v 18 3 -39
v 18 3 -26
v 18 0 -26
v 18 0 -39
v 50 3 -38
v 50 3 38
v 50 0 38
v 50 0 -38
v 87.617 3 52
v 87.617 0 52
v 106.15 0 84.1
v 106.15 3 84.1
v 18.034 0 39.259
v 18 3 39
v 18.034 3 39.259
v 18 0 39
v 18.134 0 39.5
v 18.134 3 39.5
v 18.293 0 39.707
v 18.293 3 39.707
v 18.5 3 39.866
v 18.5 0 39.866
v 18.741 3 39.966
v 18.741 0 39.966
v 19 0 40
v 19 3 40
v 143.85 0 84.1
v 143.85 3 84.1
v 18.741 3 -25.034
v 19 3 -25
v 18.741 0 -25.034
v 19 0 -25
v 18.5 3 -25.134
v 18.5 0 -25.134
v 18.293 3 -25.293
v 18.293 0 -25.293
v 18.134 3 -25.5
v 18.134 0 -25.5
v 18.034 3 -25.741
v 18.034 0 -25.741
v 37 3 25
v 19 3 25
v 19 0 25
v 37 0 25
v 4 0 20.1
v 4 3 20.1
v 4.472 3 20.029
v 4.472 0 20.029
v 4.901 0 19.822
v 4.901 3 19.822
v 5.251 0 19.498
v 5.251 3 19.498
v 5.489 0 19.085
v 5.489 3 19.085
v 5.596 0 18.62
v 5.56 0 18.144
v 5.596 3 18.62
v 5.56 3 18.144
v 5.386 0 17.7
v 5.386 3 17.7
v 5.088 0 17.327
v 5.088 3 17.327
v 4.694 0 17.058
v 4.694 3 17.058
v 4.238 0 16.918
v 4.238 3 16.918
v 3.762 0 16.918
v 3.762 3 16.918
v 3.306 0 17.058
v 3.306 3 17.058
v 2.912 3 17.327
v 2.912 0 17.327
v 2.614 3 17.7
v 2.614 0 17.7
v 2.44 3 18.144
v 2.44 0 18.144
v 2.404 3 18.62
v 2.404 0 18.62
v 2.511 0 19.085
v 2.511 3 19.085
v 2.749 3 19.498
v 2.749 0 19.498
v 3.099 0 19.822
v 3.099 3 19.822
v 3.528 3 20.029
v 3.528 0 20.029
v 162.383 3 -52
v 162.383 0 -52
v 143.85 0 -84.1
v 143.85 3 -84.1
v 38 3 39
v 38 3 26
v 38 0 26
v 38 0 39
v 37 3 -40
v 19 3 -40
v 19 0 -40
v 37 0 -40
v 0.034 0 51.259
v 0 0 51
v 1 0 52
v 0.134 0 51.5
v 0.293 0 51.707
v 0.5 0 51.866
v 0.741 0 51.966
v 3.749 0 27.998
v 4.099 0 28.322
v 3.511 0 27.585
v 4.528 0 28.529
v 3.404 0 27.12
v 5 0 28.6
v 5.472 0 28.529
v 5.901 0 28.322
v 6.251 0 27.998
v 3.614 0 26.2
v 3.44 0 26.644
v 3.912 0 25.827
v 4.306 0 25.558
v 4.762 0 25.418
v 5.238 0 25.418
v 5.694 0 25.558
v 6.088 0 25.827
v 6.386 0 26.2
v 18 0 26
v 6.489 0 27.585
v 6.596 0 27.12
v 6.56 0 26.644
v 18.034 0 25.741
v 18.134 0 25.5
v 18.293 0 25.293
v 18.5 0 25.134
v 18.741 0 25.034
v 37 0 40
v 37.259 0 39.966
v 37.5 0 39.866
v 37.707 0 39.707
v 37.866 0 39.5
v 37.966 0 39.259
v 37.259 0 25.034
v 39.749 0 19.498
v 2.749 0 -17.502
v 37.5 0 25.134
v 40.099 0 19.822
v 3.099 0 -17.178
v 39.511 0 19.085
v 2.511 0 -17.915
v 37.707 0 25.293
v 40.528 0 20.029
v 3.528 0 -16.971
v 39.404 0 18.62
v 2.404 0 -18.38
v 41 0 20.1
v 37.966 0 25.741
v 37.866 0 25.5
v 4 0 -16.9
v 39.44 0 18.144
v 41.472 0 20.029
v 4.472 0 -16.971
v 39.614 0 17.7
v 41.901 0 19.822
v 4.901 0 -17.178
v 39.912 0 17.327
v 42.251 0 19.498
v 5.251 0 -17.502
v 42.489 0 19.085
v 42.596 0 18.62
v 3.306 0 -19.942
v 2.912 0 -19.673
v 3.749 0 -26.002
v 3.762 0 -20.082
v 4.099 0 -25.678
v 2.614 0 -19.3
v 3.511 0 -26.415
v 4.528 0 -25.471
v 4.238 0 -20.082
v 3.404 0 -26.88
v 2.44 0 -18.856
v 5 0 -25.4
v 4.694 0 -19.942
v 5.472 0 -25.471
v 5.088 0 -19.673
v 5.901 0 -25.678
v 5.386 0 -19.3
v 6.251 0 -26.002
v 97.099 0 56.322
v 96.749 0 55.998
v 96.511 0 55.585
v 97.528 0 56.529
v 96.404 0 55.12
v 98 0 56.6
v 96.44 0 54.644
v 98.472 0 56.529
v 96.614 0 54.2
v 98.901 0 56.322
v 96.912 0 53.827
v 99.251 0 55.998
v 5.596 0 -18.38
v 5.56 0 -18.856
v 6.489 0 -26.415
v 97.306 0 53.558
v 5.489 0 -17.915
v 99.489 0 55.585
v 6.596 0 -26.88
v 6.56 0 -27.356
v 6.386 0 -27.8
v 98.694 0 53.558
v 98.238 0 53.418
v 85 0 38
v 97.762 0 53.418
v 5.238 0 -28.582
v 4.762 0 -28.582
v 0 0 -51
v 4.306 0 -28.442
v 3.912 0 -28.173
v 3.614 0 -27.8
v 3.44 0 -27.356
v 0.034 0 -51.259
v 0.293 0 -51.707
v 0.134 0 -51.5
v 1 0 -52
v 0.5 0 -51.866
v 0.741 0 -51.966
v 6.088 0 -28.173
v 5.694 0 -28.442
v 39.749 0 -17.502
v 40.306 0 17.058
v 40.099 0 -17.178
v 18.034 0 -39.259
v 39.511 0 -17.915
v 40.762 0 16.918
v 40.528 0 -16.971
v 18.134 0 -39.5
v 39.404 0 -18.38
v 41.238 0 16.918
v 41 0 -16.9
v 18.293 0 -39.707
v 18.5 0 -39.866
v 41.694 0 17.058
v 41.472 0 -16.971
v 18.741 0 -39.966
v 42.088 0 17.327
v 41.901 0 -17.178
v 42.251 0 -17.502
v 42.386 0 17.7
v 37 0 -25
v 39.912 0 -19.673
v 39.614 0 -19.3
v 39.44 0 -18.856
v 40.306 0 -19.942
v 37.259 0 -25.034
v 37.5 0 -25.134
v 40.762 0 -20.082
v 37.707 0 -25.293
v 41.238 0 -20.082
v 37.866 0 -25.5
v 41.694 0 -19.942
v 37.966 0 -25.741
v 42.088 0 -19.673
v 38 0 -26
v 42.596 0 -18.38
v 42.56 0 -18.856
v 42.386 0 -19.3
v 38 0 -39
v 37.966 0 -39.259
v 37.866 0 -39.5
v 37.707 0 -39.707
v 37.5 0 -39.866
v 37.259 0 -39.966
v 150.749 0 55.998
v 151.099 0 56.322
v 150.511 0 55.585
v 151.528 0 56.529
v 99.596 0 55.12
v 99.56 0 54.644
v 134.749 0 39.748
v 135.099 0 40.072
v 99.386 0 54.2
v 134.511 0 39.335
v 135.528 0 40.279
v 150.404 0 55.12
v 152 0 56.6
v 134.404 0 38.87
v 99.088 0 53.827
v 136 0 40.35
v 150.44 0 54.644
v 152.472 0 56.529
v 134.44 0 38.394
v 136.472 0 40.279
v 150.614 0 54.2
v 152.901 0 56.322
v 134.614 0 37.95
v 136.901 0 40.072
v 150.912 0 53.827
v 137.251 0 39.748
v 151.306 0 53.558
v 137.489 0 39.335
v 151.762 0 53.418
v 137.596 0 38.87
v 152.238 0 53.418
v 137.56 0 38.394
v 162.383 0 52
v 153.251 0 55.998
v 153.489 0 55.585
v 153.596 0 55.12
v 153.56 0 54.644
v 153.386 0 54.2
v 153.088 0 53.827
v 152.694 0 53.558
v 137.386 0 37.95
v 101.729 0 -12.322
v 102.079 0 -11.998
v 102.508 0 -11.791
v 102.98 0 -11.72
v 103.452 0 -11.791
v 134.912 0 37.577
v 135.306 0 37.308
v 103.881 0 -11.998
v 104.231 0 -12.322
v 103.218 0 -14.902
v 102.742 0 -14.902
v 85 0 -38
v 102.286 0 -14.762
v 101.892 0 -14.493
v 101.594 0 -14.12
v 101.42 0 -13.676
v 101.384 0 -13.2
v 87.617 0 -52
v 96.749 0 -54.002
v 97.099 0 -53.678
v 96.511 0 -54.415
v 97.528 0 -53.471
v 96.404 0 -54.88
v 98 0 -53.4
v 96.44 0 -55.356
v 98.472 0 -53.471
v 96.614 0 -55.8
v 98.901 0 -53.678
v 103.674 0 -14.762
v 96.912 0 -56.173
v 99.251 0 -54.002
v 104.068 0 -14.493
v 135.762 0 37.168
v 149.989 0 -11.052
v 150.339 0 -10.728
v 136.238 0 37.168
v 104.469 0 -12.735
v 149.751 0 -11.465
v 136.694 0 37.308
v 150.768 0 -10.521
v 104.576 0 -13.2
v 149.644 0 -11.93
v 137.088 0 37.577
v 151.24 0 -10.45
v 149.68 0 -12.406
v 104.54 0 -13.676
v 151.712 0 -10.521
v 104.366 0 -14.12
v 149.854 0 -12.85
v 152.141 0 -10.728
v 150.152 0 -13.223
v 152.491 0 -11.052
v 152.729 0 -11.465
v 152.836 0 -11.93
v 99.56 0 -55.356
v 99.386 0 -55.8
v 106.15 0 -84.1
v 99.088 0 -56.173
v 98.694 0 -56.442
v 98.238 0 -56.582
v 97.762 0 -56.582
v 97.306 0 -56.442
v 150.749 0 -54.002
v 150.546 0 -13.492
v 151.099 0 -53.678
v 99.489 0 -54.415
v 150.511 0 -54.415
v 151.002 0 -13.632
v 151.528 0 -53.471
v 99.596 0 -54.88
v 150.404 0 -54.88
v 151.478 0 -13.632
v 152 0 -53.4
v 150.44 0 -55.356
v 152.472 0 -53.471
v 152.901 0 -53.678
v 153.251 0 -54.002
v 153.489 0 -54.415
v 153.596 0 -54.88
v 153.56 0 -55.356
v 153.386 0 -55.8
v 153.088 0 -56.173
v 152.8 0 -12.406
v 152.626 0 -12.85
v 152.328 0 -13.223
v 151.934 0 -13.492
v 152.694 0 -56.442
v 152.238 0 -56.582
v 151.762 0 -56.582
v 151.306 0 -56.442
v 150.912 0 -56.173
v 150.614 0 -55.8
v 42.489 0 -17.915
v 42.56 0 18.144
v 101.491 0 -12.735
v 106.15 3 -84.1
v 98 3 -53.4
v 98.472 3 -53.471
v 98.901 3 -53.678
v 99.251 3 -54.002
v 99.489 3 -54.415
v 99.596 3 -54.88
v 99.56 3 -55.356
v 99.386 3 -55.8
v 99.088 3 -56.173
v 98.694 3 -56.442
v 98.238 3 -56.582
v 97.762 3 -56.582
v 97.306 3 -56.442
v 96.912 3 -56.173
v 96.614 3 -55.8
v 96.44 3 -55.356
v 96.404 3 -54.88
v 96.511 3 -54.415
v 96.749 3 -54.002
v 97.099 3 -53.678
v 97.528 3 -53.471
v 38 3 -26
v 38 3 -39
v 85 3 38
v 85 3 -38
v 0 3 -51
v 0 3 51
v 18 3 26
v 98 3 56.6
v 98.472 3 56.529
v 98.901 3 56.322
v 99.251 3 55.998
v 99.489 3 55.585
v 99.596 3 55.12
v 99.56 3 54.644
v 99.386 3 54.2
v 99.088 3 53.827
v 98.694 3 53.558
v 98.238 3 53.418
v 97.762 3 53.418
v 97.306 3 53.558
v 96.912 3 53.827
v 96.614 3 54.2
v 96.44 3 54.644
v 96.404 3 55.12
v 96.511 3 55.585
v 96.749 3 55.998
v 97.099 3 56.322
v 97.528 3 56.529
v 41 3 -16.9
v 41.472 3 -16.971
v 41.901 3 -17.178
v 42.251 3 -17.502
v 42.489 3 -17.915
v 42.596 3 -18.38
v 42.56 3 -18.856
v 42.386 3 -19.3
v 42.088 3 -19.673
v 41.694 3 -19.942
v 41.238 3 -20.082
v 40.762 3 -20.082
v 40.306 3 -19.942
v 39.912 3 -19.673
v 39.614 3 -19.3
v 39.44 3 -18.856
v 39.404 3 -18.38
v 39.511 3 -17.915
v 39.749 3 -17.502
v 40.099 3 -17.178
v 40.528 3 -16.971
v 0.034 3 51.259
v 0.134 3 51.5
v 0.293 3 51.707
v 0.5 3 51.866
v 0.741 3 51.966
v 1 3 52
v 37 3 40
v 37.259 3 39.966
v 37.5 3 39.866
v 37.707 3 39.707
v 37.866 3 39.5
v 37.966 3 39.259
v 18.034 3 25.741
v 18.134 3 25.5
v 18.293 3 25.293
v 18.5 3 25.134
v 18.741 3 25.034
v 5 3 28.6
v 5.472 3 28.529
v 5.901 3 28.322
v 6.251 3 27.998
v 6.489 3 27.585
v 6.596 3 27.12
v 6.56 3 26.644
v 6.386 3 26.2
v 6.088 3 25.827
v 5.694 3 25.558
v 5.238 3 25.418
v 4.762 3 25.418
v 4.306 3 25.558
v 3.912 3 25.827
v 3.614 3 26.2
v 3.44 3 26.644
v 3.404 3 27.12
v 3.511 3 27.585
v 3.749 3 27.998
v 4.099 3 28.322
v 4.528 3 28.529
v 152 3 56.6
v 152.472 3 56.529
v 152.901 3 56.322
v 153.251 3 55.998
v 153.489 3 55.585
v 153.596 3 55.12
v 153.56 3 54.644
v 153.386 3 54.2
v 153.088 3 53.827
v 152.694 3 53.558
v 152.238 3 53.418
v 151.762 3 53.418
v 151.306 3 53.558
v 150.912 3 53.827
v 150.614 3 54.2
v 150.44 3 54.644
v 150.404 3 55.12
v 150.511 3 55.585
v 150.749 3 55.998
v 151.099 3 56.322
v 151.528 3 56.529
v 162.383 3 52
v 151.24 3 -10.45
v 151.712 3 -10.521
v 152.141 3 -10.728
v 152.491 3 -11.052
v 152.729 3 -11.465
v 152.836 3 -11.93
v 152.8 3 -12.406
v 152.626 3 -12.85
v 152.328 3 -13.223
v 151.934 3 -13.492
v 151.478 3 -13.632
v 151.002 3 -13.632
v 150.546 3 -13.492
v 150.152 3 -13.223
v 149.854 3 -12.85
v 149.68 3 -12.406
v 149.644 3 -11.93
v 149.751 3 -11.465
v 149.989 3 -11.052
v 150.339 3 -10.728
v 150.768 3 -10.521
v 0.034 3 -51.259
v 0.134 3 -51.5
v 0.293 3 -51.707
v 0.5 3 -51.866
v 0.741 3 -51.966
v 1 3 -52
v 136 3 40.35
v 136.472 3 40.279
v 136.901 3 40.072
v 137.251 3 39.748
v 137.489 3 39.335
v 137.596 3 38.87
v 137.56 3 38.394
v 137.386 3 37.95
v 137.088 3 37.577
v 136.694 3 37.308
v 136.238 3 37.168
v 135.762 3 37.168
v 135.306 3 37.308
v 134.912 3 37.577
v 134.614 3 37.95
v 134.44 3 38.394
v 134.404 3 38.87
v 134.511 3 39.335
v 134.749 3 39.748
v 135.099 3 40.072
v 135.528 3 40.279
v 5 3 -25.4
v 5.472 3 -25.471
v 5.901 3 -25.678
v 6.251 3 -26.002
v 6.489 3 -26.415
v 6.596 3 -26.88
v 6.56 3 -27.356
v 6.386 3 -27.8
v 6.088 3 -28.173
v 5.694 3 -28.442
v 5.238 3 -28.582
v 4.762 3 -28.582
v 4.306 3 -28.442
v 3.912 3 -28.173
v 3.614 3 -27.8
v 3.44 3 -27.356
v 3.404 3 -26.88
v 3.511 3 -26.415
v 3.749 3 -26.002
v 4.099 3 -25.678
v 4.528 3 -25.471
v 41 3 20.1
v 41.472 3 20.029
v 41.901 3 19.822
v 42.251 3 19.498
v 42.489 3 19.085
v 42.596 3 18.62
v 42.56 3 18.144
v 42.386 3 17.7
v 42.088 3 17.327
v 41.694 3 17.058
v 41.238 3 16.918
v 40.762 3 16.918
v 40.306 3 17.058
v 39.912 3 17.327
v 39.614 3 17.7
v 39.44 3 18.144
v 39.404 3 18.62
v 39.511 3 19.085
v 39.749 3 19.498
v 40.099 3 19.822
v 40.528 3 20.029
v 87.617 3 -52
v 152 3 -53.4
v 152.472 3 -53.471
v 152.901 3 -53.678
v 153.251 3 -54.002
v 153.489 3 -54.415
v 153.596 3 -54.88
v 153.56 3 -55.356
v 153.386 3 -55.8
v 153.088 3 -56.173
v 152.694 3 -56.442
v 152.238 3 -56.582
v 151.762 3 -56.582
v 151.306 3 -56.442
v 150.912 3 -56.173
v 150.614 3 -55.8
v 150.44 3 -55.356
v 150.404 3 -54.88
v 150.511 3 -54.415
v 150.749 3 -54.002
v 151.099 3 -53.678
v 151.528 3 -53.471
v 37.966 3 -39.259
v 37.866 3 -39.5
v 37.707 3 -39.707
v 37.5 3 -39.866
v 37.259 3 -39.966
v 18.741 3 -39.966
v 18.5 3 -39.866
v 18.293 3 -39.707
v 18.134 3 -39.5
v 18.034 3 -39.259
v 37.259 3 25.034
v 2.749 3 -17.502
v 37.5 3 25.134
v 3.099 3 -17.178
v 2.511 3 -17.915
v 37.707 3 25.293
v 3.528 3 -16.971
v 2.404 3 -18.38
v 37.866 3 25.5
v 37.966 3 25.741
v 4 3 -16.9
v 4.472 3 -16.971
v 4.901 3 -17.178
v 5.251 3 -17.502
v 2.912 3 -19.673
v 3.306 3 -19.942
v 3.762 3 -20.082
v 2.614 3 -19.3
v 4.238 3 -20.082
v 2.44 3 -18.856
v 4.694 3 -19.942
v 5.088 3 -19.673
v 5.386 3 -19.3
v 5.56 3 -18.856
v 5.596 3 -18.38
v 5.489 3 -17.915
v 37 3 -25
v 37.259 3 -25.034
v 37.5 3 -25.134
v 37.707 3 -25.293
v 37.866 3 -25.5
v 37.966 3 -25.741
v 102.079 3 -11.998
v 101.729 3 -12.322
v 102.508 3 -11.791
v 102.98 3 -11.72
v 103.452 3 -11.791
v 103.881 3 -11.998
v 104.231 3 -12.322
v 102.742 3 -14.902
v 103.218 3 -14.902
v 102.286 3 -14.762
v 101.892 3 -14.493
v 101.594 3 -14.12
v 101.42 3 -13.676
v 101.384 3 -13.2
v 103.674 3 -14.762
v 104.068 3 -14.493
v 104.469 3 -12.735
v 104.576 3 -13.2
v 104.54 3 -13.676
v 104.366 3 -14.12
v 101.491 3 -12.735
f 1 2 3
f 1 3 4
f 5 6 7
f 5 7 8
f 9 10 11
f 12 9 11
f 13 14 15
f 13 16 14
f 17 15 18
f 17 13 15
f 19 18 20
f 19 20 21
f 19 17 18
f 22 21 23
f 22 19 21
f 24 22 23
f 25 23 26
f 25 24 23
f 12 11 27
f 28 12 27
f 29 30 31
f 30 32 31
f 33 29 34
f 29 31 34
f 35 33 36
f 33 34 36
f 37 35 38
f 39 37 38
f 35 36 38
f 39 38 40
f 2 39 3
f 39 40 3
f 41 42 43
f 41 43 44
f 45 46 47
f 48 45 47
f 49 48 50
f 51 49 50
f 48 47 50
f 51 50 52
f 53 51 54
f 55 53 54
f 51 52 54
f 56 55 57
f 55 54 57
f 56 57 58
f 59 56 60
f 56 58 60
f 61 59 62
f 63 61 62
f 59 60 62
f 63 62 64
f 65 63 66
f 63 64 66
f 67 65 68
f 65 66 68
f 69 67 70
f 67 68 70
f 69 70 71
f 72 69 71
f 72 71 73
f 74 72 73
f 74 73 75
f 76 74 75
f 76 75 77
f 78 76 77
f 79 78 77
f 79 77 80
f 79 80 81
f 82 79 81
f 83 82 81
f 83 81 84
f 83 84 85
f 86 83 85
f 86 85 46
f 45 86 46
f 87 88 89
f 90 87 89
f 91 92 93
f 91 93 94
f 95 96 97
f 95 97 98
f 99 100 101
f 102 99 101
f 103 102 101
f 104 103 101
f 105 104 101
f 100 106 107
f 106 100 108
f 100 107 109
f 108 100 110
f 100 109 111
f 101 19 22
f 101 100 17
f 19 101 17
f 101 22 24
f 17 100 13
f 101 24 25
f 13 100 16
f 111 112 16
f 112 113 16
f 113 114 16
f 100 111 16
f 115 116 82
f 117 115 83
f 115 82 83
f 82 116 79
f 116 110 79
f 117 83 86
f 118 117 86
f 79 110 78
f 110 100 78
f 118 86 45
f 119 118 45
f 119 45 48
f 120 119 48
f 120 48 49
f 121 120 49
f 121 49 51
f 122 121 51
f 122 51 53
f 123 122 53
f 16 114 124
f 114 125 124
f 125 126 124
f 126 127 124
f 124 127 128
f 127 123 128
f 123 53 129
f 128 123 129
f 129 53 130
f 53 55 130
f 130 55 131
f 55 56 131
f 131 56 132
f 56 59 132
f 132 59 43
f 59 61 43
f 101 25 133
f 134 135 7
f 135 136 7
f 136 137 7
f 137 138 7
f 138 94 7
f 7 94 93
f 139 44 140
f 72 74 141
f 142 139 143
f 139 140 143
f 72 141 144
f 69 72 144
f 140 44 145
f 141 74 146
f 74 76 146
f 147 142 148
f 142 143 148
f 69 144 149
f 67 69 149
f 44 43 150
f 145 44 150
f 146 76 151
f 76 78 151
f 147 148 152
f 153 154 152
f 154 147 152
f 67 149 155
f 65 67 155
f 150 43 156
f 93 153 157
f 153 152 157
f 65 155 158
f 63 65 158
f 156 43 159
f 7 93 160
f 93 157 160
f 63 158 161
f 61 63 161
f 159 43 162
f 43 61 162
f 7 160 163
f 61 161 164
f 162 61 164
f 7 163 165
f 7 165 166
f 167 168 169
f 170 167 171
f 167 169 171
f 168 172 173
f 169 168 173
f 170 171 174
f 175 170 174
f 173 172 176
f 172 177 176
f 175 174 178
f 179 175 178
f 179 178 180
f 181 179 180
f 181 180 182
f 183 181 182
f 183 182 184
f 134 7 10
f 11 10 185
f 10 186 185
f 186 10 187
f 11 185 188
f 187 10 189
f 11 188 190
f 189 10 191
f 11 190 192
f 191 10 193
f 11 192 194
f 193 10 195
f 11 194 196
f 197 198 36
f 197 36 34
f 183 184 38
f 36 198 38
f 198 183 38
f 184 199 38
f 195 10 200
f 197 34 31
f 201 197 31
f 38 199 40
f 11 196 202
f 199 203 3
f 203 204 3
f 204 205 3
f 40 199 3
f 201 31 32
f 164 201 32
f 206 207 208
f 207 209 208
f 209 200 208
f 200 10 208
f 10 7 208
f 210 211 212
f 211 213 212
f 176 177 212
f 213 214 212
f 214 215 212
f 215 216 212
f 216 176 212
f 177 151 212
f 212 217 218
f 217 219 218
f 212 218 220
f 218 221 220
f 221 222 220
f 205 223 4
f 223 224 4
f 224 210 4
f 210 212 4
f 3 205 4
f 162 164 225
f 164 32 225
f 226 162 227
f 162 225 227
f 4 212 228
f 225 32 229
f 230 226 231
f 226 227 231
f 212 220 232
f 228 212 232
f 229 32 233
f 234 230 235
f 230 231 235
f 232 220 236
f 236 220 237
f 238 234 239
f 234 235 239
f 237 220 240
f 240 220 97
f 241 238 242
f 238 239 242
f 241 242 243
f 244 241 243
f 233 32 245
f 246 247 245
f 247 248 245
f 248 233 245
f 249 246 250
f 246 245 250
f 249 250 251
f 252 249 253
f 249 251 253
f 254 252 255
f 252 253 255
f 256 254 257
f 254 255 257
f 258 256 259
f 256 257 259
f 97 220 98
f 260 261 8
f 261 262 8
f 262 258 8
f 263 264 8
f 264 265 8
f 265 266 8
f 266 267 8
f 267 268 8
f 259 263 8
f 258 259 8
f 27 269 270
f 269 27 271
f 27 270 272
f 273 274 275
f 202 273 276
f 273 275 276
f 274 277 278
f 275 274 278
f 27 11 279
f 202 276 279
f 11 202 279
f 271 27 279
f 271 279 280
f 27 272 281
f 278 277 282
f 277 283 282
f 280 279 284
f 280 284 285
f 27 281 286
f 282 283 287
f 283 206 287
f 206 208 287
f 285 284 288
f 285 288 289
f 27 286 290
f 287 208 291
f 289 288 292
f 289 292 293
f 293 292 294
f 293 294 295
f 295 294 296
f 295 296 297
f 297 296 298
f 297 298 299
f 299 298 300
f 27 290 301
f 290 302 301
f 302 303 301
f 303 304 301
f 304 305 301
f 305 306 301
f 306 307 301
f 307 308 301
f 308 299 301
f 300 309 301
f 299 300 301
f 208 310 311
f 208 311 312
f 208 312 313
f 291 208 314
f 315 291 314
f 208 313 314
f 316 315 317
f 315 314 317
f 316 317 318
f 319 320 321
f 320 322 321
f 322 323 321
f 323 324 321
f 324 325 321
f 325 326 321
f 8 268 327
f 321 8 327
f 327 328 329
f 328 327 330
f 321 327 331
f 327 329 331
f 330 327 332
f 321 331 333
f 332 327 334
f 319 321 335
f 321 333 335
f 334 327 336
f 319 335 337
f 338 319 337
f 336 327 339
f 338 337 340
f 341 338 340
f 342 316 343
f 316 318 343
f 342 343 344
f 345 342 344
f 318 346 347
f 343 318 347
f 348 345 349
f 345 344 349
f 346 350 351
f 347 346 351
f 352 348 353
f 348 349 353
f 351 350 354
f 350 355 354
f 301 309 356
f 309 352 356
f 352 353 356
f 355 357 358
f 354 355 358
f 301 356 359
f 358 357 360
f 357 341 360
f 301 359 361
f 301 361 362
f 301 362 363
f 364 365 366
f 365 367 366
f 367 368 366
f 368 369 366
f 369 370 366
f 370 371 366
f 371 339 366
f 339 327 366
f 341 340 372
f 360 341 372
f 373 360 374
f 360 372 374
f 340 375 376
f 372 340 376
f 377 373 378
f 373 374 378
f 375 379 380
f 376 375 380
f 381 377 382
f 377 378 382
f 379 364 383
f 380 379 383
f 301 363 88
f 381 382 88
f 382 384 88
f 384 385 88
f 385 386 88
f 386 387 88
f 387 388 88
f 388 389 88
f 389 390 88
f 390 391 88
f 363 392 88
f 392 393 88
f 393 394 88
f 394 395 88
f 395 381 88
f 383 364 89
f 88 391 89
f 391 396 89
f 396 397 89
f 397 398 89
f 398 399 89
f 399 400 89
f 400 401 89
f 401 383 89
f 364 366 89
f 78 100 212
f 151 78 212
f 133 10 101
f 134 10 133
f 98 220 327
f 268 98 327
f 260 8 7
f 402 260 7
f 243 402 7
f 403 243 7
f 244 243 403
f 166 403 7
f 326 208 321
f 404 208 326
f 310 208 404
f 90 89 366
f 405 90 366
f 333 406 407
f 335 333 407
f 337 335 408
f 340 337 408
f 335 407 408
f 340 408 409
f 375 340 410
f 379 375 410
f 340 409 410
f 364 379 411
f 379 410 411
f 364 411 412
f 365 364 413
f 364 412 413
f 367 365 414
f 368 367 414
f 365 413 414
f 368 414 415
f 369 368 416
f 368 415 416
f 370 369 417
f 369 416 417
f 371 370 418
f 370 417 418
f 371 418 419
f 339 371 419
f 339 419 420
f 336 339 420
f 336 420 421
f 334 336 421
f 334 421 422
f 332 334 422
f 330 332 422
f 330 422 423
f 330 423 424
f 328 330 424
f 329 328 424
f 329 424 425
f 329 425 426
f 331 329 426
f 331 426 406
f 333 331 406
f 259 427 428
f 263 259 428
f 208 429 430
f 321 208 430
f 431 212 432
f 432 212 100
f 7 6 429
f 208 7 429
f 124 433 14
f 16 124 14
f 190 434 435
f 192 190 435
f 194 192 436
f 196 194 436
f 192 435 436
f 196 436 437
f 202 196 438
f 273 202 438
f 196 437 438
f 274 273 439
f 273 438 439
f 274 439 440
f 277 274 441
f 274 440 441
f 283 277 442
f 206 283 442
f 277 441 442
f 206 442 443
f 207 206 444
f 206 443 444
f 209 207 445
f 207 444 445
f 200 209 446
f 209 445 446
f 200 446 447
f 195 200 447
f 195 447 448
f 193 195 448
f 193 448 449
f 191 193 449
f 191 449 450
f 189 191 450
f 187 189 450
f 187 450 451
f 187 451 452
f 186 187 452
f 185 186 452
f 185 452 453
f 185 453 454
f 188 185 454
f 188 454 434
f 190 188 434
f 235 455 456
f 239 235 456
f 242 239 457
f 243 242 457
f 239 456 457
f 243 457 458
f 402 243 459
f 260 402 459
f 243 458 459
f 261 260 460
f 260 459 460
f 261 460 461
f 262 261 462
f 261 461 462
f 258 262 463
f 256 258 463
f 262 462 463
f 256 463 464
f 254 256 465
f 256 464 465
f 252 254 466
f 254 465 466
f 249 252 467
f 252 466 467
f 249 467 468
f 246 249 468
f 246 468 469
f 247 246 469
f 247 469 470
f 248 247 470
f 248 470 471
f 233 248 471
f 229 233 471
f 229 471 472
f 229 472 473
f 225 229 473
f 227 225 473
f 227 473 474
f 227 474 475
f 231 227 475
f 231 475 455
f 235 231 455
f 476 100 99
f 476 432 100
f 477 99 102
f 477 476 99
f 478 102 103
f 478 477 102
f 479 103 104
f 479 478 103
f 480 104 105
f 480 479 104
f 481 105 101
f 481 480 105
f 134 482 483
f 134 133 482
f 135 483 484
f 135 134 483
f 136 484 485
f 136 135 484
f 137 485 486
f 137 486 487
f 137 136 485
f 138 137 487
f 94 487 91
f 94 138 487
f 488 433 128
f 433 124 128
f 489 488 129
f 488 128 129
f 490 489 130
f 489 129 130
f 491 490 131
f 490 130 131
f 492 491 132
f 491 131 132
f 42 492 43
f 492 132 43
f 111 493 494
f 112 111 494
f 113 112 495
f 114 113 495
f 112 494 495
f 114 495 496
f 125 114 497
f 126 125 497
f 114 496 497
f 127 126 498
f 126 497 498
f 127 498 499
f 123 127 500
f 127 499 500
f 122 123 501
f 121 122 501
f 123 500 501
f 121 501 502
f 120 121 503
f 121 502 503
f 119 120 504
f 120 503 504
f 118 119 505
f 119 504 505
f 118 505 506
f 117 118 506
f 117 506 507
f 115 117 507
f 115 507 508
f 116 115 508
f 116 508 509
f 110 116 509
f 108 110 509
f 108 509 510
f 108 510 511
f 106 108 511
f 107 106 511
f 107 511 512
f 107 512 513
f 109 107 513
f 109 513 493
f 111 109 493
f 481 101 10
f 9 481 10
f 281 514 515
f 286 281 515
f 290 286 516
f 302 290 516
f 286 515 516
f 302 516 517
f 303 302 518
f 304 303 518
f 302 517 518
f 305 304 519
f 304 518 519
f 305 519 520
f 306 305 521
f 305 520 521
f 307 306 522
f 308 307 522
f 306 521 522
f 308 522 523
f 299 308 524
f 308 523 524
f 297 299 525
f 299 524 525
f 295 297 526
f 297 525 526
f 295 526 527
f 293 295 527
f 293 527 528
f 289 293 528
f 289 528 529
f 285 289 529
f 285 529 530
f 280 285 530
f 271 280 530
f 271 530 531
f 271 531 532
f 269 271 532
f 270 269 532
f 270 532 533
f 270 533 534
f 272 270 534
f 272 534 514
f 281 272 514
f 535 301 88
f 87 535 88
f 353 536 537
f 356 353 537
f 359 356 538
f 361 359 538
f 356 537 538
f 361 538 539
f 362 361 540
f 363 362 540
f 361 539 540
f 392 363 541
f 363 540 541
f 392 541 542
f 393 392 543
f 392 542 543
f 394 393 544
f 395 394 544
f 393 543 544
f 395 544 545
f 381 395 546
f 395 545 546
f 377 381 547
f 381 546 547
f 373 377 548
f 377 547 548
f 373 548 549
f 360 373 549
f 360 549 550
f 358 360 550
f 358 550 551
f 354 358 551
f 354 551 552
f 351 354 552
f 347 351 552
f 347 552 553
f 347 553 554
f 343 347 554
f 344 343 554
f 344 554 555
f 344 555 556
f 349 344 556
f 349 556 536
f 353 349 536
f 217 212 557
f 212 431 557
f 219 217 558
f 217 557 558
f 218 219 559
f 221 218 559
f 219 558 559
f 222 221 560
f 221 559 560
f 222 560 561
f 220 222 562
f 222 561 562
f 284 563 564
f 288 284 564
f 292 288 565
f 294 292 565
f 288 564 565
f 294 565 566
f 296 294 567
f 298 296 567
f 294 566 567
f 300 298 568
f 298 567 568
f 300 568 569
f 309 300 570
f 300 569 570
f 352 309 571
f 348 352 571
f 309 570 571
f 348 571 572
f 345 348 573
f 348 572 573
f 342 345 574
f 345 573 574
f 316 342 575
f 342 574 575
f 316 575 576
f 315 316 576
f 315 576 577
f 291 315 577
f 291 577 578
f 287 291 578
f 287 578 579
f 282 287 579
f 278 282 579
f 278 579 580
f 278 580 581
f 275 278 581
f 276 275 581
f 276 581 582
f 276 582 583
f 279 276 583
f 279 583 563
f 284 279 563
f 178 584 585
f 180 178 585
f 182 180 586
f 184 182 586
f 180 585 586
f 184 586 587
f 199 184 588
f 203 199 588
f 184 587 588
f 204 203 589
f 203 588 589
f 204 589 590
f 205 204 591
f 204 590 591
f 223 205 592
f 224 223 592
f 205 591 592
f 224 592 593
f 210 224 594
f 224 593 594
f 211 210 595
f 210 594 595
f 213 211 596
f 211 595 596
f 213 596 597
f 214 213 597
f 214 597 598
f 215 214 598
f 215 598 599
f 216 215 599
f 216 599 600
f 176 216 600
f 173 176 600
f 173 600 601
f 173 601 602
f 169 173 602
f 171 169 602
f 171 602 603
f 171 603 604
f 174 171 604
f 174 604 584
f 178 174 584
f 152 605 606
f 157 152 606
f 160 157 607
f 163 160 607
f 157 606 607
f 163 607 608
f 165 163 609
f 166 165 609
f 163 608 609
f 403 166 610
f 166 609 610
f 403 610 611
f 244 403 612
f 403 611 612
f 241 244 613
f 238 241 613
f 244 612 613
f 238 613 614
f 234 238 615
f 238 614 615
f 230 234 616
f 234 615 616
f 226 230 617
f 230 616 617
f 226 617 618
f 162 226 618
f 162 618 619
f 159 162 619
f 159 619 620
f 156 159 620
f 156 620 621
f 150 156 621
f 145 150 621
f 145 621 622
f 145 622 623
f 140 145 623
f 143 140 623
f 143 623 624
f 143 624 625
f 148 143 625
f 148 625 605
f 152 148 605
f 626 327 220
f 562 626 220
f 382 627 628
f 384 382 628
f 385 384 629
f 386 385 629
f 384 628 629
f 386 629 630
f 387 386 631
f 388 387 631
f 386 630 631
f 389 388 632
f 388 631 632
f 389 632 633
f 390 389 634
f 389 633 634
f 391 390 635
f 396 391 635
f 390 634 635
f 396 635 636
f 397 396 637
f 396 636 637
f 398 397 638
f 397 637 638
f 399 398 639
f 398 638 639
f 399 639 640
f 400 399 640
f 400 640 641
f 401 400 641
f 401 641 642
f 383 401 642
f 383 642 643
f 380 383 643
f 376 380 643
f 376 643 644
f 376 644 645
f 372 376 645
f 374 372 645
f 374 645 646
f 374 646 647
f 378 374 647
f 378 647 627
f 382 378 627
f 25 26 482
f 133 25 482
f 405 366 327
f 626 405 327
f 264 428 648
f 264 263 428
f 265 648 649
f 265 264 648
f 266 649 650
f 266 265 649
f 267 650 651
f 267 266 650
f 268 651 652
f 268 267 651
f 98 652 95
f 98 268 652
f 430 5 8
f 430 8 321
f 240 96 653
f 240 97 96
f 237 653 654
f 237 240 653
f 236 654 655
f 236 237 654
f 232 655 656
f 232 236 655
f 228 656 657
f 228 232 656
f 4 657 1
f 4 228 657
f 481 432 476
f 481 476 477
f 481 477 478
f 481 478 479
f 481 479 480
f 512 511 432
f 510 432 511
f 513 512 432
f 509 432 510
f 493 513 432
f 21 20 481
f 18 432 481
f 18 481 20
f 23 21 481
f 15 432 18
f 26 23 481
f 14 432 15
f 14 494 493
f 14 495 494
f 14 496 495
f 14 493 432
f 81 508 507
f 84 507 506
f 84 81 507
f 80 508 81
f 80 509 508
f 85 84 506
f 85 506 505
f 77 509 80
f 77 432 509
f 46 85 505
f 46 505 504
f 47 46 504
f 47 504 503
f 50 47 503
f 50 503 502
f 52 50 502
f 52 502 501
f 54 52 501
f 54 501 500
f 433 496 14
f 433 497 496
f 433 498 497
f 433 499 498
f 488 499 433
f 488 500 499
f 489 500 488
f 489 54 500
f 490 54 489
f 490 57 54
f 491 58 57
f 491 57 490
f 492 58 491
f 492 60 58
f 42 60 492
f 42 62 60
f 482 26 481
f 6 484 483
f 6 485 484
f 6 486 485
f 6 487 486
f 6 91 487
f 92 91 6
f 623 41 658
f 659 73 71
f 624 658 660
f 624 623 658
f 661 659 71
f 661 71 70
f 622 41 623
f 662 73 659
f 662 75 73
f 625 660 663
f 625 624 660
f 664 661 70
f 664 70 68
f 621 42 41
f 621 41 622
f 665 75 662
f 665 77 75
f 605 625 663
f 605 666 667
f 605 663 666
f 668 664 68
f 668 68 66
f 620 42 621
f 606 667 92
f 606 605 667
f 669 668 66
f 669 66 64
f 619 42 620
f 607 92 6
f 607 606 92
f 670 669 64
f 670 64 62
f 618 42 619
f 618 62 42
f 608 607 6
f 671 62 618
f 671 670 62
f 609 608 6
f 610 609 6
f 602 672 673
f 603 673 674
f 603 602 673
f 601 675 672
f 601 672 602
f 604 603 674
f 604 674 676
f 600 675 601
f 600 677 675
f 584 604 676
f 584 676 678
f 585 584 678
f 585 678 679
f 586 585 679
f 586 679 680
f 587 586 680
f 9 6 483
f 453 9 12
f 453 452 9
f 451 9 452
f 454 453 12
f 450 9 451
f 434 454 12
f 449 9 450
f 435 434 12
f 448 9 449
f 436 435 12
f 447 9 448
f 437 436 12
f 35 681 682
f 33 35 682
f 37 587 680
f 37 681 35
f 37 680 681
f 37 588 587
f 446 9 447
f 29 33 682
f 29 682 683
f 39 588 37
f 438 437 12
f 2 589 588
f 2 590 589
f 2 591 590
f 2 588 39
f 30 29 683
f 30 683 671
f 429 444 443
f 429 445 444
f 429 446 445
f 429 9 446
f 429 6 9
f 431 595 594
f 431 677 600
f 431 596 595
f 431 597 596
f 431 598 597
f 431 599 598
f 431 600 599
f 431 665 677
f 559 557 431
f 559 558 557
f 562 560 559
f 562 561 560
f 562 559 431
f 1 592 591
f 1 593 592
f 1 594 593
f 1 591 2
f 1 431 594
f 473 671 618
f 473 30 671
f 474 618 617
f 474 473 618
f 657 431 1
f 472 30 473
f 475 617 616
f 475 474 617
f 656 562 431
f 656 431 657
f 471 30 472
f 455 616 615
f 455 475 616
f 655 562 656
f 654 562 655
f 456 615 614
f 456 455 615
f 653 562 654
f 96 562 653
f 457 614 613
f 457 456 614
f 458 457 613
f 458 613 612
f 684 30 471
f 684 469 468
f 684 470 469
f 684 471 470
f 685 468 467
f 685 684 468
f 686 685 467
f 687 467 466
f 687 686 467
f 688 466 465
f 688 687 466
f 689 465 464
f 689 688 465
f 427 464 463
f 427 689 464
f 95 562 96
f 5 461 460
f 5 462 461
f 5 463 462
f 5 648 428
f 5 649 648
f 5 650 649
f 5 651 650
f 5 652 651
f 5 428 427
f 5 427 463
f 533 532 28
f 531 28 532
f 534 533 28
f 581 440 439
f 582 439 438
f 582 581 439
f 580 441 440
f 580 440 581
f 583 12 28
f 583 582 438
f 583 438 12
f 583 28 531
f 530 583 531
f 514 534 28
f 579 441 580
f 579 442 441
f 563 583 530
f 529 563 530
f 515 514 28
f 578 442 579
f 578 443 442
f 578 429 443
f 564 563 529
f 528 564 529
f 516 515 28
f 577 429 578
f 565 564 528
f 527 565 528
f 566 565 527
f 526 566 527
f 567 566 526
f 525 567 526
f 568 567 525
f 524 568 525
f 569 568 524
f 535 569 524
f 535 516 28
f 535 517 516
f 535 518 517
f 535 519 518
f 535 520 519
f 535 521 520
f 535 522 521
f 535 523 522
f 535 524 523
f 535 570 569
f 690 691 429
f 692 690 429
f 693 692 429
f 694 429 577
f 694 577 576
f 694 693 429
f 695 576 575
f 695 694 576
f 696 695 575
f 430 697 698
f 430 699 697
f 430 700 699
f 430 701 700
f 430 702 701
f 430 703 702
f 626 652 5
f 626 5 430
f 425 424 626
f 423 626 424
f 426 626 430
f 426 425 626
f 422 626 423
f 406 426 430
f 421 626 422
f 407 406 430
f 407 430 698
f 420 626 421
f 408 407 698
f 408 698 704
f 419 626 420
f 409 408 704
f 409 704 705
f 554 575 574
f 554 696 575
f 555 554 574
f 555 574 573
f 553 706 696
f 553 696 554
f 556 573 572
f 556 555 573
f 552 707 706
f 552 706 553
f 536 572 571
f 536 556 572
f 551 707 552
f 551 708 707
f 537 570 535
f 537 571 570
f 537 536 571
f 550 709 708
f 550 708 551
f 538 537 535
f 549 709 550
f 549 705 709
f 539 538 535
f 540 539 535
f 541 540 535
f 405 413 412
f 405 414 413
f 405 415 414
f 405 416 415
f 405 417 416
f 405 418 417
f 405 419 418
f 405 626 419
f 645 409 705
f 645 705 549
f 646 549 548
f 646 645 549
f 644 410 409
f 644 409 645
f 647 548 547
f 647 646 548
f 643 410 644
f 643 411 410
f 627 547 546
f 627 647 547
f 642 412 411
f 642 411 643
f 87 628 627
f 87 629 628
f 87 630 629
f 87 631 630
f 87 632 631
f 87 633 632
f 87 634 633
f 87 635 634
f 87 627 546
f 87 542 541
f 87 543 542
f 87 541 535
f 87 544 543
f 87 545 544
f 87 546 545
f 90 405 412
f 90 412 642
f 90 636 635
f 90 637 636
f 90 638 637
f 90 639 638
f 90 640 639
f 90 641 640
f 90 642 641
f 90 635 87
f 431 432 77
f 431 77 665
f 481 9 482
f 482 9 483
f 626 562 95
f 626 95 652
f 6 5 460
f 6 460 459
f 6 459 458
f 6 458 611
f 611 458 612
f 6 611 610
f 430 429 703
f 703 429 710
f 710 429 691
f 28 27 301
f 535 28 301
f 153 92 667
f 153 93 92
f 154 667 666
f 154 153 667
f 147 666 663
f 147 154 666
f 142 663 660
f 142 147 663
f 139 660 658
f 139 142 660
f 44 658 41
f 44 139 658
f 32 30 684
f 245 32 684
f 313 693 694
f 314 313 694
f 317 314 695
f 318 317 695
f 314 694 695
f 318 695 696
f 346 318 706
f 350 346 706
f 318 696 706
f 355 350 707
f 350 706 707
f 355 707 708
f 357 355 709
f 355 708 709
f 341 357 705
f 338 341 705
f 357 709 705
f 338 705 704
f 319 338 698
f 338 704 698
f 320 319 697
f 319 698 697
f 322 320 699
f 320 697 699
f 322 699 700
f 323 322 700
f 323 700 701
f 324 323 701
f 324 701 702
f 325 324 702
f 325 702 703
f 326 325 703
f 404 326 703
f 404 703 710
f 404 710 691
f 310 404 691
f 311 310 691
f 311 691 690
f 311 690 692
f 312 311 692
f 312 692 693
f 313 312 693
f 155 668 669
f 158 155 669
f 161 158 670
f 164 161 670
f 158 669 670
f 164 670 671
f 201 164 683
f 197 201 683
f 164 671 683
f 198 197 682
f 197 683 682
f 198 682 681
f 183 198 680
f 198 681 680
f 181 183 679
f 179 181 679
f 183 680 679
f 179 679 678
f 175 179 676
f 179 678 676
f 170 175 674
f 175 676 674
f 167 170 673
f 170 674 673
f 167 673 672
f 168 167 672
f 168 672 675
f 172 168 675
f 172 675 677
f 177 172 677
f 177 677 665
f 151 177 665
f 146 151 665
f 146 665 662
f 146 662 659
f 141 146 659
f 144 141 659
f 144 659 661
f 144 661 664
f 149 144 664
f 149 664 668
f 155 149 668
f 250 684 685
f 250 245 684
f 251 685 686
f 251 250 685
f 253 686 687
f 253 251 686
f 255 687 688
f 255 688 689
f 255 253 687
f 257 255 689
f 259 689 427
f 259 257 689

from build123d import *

# Parameters (mm, degrees)
BOSS_EXTRUDE1_DEPTH                        = 3
FILLET1_R                                  = 1
SKETCH2_R                                  = 1.6
MOTOR_DRIVER_HOLES_DEPTH                   = 183.893494651
SKETCH3_W                                  = 20
SKETCH3_H                                  = 15
MOTOR_DRIVER_ROUTING_POCKET_DEPTH          = 183.893494651
MOTOR_DRIVER_ROUTING_POCKET_FILLETS_R      = 1
MOTOR_DRIVER_ROUTING_POCKET_FILLETS_OF_M_R = 1
SKETCH5_W                                  = 35
SKETCH5_H                                  = 76
BATTERY_SEAT_DEPTH                         = 183.893494651
SKETCH6_R                                  = 1.6
MICROCONTROLLER_STANDOFF_HOLES_DEPTH       = 183.893494651
SKETCH8_R                                  = 1.6
PLATE_STANDOFF_HOLES_DEPTH                 = 183.893494651


with BuildPart() as part:
    # Sketch1 → Boss-Extrude1 (new body)
    with BuildSketch(Plane(origin=(0, 0, 0), x_dir=(1, 0, 0), z_dir=(0, 1, 0))):
        Polygon((0, 52), (0, -52), (87.617056359, -52), (106.15, -84.1), (143.85, -84.1), (162.382943641, -52), (162.382943641, 52), (143.85, 84.1), (106.15, 84.1), (87.617056359, 52), align=None)
    extrude(amount=BOSS_EXTRUDE1_DEPTH)

    # Fillet1
    fillet1_edges = [part.edges().sort_by_distance(p)[0] for p in [
        (0, 1.5, 52),
        (0, 1.5, -52),
    ]]
    fillet(fillet1_edges, radius=FILLET1_R)

    # Sketch2 → Motor Driver Holes (cut, through all)
    with BuildSketch(Plane(origin=(0, 3, 0), x_dir=(1, 0, 0), z_dir=(0, 1, 0))):
        with Locations(Location((4, 18.5, 0), (0, 0, 270))):
            Circle(SKETCH2_R)
        with Locations(Location((41, 18.5, 0), (0, 0, 270))):
            Circle(SKETCH2_R)
        with Locations(Location((4, -18.5, 0), (0, 0, 270))):
            Circle(SKETCH2_R)
        with Locations(Location((41, -18.5, 0), (0, 0, 270))):
            Circle(SKETCH2_R)
    extrude(amount=-MOTOR_DRIVER_HOLES_DEPTH, mode=Mode.SUBTRACT)

    # Sketch3 → Motor Driver Routing Pocket (cut, through all)
    with BuildSketch(Plane(origin=(0, 3, 0), x_dir=(1, 0, 0), z_dir=(0, 1, 0))):
        with Locations((28, 32.5)):
            Rectangle(SKETCH3_W, SKETCH3_H)
    motor_driver_routing_pocket = extrude(amount=-MOTOR_DRIVER_ROUTING_POCKET_DEPTH, mode=Mode.SUBTRACT)

    # Motor Driver Routing Pocket Fillets
    motor_driver_routing_pocket_fillets_edges = [part.edges().sort_by_distance(p)[0] for p in [
        (38, 1.5, -40),
        (38, 1.5, -25),
        (18, 1.5, -25),
        (18, 1.5, -40),
    ]]
    fillet(motor_driver_routing_pocket_fillets_edges, radius=MOTOR_DRIVER_ROUTING_POCKET_FILLETS_R)

    # Mirror1: Motor Driver Routing Pocket across plane
    add(motor_driver_routing_pocket.mirror(Plane.XY), mode=Mode.SUBTRACT)

    # Motor Driver Routing Pocket Fillets of M
    motor_driver_routing_pocket_fillets_of_m_edges = [part.edges().sort_by_distance(p)[0] for p in [
        (38, 1.5, 40),
        (38, 1.5, 25),
        (18, 1.5, 25),
        (18, 1.5, 40),
    ]]
    fillet(motor_driver_routing_pocket_fillets_of_m_edges, radius=MOTOR_DRIVER_ROUTING_POCKET_FILLETS_OF_M_R)

    # Sketch5 → Battery Seat (cut, through all)
    with BuildSketch(Plane(origin=(0, 3, 0), x_dir=(1, 0, 0), z_dir=(0, 1, 0))):
        with Locations((67.5, 0)):
            Rectangle(SKETCH5_W, SKETCH5_H)
    extrude(amount=-BATTERY_SEAT_DEPTH, mode=Mode.SUBTRACT)

    # Sketch6 → Microcontroller Standoff Holes (cut, through all)
    with BuildSketch(Plane(origin=(0, 3, 0), x_dir=(1, 0, 0), z_dir=(0, 1, 0))):
        with Locations(Location((136, -38.75, 0), (0, 0, 270))):
            Circle(SKETCH6_R)
        with Locations(Location((151.24, 12.05, 0), (0, 0, 270))):
            Circle(SKETCH6_R)
        with Locations(Location((102.98, 13.32, 0), (0, 0, 270))):
            Circle(SKETCH6_R)
    extrude(amount=-MICROCONTROLLER_STANDOFF_HOLES_DEPTH, mode=Mode.SUBTRACT)

    # Sketch8 → Plate Standoff Holes (cut, through all)
    with BuildSketch(Plane(origin=(0, 3, 0), x_dir=(1, 0, 0), z_dir=(0, 1, 0))):
        with Locations(Location((5, 27, 0), (0, 0, 270))):
            Circle(SKETCH8_R)
        with Locations(Location((5, -27, 0), (0, 0, 270))):
            Circle(SKETCH8_R)
        with Locations(Location((98, -55, 0), (0, 0, 270))):
            Circle(SKETCH8_R)
        with Locations(Location((98, 55, 0), (0, 0, 270))):
            Circle(SKETCH8_R)
        with Locations(Location((152, -55, 0), (0, 0, 270))):
            Circle(SKETCH8_R)
        with Locations(Location((152, 55, 0), (0, 0, 270))):
            Circle(SKETCH8_R)
    extrude(amount=-PLATE_STANDOFF_HOLES_DEPTH, mode=Mode.SUBTRACT)


solid = part.part
